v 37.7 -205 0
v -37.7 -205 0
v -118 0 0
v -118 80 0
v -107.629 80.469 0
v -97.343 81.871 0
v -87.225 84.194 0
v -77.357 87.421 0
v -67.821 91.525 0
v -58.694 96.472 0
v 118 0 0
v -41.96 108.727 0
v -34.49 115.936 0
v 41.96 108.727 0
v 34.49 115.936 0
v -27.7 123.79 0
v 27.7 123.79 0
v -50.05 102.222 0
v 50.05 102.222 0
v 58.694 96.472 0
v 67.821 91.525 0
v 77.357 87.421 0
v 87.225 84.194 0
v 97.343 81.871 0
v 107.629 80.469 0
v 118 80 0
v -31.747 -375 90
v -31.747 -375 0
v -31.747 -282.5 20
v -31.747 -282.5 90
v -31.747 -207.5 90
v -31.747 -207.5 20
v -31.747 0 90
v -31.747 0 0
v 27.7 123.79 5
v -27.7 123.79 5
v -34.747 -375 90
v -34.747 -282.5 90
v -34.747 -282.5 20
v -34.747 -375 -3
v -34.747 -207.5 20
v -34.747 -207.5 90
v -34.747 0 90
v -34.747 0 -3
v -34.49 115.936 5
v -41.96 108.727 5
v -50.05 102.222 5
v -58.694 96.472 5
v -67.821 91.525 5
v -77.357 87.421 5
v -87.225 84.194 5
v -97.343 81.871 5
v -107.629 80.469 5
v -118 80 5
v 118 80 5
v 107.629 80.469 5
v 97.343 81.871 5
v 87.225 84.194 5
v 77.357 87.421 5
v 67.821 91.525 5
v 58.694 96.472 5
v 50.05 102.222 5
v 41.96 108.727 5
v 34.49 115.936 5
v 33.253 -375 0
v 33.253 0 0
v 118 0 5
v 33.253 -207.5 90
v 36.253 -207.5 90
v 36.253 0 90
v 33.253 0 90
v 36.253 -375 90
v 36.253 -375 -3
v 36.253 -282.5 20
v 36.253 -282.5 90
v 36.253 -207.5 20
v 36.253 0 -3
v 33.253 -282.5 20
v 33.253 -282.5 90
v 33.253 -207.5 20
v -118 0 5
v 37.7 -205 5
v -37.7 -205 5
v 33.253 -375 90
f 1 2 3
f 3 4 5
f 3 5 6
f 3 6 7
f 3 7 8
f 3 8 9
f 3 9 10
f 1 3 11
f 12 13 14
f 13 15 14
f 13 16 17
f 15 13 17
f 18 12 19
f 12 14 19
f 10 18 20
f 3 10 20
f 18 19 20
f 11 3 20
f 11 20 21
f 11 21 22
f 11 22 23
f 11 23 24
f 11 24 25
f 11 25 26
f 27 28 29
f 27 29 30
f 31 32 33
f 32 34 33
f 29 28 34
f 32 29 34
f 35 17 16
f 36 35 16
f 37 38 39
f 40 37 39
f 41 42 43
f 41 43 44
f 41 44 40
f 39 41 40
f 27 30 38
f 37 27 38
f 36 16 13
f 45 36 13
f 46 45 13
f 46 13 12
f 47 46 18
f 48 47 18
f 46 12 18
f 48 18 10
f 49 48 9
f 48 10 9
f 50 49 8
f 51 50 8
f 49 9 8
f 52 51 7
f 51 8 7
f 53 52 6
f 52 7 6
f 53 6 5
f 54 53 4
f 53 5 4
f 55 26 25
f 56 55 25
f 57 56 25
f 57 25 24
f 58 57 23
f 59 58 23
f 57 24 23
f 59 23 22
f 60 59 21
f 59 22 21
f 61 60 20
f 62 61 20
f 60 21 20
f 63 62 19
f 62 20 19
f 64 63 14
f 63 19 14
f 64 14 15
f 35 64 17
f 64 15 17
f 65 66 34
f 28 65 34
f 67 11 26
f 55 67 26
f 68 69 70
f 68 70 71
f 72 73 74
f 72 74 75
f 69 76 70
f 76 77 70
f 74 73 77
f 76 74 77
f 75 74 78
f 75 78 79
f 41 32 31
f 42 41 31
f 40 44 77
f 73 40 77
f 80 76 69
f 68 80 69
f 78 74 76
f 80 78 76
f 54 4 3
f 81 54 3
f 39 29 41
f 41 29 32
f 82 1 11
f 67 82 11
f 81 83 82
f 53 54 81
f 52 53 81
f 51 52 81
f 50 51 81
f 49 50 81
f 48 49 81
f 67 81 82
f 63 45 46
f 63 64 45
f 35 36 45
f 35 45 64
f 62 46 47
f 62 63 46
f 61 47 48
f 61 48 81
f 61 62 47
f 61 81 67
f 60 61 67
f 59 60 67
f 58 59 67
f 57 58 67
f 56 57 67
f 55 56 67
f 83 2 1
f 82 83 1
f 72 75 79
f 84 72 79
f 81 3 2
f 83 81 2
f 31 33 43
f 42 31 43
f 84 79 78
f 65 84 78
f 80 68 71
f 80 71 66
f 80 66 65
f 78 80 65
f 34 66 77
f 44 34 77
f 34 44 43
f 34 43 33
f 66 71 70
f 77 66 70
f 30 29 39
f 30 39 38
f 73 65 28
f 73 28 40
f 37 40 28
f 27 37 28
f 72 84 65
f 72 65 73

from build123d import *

# Parameters (mm, degrees)
F1_DEPTH = 375
F2_W     = 75
F2_H     = 70
F3_DEPTH = 107
F5_DEPTH = 5


with BuildPart() as f1:
    # F0 (on Front) → F1 (new body)
    with BuildSketch(Plane.XZ):
        Polygon((-31.746836, 0), (-31.746836, 90), (-34.746836, 90), (-34.746836, -3), (36.253164, -3), (36.253164, 90), (33.253164, 90), (33.253164, 0), align=None)
    extrude(amount=F1_DEPTH)

    # F2 (on face) → F3 (cut)
    with BuildSketch(Plane.YZ.offset(36.253164)):
        with Locations((-245, 55)):
            Rectangle(F2_W, F2_H)
    extrude(amount=-F3_DEPTH, mode=Mode.SUBTRACT)


with BuildPart() as f5:
    # F4 (on Top) → F5 (new body)
    with BuildSketch(Plane.XY):
        with BuildLine():
            Line((-118, 80), (-118, 0))
            Line((-118, 0), (118, 0))
            Line((118, 0), (118, 80))
            ThreePointArc((118, 80), (67.821255, 91.524913), (27.7, 123.789678))
            Line((27.7, 123.789678), (-27.7, 123.789678))
            ThreePointArc((-27.7, 123.789678), (-67.821255, 91.524913), (-118, 80))
        make_face()
        Polygon((118, 0), (-118, 0), (-37.7, -205), (37.7, -205), align=None)
    extrude(amount=F5_DEPTH)


solid = Compound([f1.part, f5.part])
